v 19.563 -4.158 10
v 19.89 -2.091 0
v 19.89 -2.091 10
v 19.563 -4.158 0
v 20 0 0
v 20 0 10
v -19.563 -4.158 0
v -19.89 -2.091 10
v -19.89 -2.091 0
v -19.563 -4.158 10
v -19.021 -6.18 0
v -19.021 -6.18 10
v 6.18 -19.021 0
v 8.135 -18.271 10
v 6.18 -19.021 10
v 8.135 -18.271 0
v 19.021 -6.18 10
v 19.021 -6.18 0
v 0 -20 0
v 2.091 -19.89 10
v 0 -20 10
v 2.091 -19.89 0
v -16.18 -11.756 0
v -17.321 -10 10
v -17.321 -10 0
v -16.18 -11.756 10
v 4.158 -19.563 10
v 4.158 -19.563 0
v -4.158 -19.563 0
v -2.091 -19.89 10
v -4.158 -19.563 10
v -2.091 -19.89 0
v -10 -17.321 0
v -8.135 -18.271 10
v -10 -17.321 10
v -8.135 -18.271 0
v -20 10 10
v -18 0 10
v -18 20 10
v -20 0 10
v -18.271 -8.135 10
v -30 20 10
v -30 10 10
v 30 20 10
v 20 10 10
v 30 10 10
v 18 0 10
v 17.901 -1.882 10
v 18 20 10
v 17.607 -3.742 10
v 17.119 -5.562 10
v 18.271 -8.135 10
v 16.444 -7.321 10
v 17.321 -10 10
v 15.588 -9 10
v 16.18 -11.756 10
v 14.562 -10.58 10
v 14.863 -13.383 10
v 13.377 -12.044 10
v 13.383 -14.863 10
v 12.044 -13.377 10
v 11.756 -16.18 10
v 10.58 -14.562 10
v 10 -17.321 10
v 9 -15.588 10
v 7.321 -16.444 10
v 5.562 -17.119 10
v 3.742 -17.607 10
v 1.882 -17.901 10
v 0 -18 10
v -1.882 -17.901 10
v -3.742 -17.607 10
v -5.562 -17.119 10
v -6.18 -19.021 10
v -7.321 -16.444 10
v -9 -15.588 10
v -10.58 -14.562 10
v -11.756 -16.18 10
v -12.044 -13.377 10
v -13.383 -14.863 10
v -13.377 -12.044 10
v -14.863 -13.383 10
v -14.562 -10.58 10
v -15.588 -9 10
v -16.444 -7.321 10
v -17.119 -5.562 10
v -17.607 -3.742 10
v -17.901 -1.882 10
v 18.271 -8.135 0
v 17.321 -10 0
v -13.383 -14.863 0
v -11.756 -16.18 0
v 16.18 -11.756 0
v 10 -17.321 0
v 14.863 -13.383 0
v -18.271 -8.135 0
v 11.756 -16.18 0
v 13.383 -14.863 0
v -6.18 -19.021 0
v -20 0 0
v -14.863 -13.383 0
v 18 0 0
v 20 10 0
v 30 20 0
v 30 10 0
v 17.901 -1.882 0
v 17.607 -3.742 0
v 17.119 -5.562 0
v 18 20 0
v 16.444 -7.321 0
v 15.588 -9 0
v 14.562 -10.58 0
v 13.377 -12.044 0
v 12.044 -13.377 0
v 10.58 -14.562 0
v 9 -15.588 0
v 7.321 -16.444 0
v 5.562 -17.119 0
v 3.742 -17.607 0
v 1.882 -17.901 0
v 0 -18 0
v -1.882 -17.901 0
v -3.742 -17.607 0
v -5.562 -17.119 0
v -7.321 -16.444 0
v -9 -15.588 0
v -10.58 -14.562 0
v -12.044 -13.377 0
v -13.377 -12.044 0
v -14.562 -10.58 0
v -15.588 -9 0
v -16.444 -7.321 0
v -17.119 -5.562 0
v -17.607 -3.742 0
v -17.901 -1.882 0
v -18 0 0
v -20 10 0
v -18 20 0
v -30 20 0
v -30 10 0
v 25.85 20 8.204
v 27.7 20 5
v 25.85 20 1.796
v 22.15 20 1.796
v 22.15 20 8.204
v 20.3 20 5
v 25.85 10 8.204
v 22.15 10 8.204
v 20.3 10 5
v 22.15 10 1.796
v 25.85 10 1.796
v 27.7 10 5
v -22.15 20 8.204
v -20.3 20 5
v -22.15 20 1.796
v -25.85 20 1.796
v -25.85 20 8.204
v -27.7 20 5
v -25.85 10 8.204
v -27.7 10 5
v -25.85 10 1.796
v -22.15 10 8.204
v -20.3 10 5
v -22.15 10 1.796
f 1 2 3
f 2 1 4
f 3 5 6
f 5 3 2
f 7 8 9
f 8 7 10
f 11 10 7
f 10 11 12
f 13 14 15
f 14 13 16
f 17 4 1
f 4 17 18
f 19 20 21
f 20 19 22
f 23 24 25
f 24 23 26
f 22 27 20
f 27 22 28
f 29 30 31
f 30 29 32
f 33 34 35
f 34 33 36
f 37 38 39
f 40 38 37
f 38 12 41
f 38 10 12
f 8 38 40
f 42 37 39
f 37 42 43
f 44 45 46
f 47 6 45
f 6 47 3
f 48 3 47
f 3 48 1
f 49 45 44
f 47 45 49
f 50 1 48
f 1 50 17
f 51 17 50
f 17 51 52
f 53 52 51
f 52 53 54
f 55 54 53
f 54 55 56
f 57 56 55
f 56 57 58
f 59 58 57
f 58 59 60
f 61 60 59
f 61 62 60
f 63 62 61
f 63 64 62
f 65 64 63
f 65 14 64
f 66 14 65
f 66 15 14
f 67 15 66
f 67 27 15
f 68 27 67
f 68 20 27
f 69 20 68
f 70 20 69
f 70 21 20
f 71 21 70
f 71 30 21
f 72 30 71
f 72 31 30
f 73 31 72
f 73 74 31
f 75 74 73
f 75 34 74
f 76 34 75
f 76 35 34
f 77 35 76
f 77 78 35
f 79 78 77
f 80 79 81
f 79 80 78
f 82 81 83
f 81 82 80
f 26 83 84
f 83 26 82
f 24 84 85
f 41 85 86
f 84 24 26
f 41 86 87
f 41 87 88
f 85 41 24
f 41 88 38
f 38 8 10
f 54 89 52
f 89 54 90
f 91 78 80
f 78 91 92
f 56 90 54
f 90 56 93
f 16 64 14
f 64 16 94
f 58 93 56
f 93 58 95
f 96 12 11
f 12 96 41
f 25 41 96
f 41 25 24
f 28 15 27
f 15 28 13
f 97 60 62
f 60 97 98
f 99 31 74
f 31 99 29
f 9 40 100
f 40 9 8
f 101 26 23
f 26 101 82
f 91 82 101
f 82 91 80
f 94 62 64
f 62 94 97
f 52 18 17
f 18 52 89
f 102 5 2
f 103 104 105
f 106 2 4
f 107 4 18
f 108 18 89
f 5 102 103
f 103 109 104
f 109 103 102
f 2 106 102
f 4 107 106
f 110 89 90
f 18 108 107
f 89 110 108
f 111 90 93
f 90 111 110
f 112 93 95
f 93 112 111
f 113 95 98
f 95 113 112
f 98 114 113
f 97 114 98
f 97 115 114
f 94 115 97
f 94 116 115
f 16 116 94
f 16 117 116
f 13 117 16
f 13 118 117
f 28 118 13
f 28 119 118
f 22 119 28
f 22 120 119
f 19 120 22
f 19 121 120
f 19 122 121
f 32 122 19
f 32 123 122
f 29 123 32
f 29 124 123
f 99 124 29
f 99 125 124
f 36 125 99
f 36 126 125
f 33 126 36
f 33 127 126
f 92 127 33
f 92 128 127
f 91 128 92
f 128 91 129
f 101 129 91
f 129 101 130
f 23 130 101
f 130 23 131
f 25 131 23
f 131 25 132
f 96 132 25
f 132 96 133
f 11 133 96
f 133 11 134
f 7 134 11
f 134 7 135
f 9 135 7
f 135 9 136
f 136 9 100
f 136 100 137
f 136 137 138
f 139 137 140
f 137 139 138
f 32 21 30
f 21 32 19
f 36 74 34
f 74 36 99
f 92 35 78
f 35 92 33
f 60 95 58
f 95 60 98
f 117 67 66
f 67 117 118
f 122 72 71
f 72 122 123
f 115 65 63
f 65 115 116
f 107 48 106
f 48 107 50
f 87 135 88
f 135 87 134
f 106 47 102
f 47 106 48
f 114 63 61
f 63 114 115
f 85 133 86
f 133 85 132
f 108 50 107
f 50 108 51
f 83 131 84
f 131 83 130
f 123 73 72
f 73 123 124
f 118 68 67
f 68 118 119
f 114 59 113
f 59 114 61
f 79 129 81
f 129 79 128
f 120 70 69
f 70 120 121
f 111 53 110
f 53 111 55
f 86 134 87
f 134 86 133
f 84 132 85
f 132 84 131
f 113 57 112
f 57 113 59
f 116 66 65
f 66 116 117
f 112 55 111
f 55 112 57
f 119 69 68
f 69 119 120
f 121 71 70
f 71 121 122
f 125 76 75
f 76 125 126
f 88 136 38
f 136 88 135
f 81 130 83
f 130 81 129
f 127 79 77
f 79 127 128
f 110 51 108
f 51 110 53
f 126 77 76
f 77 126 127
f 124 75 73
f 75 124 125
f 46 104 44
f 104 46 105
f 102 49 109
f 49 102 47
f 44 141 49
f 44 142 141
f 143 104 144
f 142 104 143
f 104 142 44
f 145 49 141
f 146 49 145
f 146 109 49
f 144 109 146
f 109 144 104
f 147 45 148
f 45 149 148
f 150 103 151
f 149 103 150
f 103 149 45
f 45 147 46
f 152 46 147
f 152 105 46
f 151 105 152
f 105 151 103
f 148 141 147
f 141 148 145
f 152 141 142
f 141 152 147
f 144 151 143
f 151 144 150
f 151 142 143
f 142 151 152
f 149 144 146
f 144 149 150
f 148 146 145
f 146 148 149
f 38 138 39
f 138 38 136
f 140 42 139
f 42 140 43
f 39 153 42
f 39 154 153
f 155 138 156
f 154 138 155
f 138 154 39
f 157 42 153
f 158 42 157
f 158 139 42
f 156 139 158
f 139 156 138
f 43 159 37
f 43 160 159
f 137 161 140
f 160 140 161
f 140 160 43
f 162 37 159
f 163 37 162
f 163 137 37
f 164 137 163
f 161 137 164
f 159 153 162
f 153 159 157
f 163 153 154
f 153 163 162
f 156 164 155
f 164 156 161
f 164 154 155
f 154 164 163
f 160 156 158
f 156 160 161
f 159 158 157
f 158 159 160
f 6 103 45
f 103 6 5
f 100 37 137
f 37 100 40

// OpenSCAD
ro=20;
difference(){
difference(){
cylinder(r=ro,h=10,$fn=60);//outer diameter
cylinder(r=ro-2,h=10,$fn=60);//inner diameter
}
translate([-45,0,0])cube([90,45,10]);//cut
}
translate([ro-2,0,0])hola();
translate([-ro-10,0,0])hola();

//cube(10);
module hola(){//making a cube with tube hole
translate([0,10,0])difference(){
    cube([12,10,10]);//tube housing outer shell
translate([6,0,5])rotate([-90,0,0])cylinder(r=3.7,h=11,$fn=6);//ear tube diameter
    }
}
translate([ro-2,0,0])cube([2,10,10]);
translate([-ro,0,0])cube([2,10,10]);
